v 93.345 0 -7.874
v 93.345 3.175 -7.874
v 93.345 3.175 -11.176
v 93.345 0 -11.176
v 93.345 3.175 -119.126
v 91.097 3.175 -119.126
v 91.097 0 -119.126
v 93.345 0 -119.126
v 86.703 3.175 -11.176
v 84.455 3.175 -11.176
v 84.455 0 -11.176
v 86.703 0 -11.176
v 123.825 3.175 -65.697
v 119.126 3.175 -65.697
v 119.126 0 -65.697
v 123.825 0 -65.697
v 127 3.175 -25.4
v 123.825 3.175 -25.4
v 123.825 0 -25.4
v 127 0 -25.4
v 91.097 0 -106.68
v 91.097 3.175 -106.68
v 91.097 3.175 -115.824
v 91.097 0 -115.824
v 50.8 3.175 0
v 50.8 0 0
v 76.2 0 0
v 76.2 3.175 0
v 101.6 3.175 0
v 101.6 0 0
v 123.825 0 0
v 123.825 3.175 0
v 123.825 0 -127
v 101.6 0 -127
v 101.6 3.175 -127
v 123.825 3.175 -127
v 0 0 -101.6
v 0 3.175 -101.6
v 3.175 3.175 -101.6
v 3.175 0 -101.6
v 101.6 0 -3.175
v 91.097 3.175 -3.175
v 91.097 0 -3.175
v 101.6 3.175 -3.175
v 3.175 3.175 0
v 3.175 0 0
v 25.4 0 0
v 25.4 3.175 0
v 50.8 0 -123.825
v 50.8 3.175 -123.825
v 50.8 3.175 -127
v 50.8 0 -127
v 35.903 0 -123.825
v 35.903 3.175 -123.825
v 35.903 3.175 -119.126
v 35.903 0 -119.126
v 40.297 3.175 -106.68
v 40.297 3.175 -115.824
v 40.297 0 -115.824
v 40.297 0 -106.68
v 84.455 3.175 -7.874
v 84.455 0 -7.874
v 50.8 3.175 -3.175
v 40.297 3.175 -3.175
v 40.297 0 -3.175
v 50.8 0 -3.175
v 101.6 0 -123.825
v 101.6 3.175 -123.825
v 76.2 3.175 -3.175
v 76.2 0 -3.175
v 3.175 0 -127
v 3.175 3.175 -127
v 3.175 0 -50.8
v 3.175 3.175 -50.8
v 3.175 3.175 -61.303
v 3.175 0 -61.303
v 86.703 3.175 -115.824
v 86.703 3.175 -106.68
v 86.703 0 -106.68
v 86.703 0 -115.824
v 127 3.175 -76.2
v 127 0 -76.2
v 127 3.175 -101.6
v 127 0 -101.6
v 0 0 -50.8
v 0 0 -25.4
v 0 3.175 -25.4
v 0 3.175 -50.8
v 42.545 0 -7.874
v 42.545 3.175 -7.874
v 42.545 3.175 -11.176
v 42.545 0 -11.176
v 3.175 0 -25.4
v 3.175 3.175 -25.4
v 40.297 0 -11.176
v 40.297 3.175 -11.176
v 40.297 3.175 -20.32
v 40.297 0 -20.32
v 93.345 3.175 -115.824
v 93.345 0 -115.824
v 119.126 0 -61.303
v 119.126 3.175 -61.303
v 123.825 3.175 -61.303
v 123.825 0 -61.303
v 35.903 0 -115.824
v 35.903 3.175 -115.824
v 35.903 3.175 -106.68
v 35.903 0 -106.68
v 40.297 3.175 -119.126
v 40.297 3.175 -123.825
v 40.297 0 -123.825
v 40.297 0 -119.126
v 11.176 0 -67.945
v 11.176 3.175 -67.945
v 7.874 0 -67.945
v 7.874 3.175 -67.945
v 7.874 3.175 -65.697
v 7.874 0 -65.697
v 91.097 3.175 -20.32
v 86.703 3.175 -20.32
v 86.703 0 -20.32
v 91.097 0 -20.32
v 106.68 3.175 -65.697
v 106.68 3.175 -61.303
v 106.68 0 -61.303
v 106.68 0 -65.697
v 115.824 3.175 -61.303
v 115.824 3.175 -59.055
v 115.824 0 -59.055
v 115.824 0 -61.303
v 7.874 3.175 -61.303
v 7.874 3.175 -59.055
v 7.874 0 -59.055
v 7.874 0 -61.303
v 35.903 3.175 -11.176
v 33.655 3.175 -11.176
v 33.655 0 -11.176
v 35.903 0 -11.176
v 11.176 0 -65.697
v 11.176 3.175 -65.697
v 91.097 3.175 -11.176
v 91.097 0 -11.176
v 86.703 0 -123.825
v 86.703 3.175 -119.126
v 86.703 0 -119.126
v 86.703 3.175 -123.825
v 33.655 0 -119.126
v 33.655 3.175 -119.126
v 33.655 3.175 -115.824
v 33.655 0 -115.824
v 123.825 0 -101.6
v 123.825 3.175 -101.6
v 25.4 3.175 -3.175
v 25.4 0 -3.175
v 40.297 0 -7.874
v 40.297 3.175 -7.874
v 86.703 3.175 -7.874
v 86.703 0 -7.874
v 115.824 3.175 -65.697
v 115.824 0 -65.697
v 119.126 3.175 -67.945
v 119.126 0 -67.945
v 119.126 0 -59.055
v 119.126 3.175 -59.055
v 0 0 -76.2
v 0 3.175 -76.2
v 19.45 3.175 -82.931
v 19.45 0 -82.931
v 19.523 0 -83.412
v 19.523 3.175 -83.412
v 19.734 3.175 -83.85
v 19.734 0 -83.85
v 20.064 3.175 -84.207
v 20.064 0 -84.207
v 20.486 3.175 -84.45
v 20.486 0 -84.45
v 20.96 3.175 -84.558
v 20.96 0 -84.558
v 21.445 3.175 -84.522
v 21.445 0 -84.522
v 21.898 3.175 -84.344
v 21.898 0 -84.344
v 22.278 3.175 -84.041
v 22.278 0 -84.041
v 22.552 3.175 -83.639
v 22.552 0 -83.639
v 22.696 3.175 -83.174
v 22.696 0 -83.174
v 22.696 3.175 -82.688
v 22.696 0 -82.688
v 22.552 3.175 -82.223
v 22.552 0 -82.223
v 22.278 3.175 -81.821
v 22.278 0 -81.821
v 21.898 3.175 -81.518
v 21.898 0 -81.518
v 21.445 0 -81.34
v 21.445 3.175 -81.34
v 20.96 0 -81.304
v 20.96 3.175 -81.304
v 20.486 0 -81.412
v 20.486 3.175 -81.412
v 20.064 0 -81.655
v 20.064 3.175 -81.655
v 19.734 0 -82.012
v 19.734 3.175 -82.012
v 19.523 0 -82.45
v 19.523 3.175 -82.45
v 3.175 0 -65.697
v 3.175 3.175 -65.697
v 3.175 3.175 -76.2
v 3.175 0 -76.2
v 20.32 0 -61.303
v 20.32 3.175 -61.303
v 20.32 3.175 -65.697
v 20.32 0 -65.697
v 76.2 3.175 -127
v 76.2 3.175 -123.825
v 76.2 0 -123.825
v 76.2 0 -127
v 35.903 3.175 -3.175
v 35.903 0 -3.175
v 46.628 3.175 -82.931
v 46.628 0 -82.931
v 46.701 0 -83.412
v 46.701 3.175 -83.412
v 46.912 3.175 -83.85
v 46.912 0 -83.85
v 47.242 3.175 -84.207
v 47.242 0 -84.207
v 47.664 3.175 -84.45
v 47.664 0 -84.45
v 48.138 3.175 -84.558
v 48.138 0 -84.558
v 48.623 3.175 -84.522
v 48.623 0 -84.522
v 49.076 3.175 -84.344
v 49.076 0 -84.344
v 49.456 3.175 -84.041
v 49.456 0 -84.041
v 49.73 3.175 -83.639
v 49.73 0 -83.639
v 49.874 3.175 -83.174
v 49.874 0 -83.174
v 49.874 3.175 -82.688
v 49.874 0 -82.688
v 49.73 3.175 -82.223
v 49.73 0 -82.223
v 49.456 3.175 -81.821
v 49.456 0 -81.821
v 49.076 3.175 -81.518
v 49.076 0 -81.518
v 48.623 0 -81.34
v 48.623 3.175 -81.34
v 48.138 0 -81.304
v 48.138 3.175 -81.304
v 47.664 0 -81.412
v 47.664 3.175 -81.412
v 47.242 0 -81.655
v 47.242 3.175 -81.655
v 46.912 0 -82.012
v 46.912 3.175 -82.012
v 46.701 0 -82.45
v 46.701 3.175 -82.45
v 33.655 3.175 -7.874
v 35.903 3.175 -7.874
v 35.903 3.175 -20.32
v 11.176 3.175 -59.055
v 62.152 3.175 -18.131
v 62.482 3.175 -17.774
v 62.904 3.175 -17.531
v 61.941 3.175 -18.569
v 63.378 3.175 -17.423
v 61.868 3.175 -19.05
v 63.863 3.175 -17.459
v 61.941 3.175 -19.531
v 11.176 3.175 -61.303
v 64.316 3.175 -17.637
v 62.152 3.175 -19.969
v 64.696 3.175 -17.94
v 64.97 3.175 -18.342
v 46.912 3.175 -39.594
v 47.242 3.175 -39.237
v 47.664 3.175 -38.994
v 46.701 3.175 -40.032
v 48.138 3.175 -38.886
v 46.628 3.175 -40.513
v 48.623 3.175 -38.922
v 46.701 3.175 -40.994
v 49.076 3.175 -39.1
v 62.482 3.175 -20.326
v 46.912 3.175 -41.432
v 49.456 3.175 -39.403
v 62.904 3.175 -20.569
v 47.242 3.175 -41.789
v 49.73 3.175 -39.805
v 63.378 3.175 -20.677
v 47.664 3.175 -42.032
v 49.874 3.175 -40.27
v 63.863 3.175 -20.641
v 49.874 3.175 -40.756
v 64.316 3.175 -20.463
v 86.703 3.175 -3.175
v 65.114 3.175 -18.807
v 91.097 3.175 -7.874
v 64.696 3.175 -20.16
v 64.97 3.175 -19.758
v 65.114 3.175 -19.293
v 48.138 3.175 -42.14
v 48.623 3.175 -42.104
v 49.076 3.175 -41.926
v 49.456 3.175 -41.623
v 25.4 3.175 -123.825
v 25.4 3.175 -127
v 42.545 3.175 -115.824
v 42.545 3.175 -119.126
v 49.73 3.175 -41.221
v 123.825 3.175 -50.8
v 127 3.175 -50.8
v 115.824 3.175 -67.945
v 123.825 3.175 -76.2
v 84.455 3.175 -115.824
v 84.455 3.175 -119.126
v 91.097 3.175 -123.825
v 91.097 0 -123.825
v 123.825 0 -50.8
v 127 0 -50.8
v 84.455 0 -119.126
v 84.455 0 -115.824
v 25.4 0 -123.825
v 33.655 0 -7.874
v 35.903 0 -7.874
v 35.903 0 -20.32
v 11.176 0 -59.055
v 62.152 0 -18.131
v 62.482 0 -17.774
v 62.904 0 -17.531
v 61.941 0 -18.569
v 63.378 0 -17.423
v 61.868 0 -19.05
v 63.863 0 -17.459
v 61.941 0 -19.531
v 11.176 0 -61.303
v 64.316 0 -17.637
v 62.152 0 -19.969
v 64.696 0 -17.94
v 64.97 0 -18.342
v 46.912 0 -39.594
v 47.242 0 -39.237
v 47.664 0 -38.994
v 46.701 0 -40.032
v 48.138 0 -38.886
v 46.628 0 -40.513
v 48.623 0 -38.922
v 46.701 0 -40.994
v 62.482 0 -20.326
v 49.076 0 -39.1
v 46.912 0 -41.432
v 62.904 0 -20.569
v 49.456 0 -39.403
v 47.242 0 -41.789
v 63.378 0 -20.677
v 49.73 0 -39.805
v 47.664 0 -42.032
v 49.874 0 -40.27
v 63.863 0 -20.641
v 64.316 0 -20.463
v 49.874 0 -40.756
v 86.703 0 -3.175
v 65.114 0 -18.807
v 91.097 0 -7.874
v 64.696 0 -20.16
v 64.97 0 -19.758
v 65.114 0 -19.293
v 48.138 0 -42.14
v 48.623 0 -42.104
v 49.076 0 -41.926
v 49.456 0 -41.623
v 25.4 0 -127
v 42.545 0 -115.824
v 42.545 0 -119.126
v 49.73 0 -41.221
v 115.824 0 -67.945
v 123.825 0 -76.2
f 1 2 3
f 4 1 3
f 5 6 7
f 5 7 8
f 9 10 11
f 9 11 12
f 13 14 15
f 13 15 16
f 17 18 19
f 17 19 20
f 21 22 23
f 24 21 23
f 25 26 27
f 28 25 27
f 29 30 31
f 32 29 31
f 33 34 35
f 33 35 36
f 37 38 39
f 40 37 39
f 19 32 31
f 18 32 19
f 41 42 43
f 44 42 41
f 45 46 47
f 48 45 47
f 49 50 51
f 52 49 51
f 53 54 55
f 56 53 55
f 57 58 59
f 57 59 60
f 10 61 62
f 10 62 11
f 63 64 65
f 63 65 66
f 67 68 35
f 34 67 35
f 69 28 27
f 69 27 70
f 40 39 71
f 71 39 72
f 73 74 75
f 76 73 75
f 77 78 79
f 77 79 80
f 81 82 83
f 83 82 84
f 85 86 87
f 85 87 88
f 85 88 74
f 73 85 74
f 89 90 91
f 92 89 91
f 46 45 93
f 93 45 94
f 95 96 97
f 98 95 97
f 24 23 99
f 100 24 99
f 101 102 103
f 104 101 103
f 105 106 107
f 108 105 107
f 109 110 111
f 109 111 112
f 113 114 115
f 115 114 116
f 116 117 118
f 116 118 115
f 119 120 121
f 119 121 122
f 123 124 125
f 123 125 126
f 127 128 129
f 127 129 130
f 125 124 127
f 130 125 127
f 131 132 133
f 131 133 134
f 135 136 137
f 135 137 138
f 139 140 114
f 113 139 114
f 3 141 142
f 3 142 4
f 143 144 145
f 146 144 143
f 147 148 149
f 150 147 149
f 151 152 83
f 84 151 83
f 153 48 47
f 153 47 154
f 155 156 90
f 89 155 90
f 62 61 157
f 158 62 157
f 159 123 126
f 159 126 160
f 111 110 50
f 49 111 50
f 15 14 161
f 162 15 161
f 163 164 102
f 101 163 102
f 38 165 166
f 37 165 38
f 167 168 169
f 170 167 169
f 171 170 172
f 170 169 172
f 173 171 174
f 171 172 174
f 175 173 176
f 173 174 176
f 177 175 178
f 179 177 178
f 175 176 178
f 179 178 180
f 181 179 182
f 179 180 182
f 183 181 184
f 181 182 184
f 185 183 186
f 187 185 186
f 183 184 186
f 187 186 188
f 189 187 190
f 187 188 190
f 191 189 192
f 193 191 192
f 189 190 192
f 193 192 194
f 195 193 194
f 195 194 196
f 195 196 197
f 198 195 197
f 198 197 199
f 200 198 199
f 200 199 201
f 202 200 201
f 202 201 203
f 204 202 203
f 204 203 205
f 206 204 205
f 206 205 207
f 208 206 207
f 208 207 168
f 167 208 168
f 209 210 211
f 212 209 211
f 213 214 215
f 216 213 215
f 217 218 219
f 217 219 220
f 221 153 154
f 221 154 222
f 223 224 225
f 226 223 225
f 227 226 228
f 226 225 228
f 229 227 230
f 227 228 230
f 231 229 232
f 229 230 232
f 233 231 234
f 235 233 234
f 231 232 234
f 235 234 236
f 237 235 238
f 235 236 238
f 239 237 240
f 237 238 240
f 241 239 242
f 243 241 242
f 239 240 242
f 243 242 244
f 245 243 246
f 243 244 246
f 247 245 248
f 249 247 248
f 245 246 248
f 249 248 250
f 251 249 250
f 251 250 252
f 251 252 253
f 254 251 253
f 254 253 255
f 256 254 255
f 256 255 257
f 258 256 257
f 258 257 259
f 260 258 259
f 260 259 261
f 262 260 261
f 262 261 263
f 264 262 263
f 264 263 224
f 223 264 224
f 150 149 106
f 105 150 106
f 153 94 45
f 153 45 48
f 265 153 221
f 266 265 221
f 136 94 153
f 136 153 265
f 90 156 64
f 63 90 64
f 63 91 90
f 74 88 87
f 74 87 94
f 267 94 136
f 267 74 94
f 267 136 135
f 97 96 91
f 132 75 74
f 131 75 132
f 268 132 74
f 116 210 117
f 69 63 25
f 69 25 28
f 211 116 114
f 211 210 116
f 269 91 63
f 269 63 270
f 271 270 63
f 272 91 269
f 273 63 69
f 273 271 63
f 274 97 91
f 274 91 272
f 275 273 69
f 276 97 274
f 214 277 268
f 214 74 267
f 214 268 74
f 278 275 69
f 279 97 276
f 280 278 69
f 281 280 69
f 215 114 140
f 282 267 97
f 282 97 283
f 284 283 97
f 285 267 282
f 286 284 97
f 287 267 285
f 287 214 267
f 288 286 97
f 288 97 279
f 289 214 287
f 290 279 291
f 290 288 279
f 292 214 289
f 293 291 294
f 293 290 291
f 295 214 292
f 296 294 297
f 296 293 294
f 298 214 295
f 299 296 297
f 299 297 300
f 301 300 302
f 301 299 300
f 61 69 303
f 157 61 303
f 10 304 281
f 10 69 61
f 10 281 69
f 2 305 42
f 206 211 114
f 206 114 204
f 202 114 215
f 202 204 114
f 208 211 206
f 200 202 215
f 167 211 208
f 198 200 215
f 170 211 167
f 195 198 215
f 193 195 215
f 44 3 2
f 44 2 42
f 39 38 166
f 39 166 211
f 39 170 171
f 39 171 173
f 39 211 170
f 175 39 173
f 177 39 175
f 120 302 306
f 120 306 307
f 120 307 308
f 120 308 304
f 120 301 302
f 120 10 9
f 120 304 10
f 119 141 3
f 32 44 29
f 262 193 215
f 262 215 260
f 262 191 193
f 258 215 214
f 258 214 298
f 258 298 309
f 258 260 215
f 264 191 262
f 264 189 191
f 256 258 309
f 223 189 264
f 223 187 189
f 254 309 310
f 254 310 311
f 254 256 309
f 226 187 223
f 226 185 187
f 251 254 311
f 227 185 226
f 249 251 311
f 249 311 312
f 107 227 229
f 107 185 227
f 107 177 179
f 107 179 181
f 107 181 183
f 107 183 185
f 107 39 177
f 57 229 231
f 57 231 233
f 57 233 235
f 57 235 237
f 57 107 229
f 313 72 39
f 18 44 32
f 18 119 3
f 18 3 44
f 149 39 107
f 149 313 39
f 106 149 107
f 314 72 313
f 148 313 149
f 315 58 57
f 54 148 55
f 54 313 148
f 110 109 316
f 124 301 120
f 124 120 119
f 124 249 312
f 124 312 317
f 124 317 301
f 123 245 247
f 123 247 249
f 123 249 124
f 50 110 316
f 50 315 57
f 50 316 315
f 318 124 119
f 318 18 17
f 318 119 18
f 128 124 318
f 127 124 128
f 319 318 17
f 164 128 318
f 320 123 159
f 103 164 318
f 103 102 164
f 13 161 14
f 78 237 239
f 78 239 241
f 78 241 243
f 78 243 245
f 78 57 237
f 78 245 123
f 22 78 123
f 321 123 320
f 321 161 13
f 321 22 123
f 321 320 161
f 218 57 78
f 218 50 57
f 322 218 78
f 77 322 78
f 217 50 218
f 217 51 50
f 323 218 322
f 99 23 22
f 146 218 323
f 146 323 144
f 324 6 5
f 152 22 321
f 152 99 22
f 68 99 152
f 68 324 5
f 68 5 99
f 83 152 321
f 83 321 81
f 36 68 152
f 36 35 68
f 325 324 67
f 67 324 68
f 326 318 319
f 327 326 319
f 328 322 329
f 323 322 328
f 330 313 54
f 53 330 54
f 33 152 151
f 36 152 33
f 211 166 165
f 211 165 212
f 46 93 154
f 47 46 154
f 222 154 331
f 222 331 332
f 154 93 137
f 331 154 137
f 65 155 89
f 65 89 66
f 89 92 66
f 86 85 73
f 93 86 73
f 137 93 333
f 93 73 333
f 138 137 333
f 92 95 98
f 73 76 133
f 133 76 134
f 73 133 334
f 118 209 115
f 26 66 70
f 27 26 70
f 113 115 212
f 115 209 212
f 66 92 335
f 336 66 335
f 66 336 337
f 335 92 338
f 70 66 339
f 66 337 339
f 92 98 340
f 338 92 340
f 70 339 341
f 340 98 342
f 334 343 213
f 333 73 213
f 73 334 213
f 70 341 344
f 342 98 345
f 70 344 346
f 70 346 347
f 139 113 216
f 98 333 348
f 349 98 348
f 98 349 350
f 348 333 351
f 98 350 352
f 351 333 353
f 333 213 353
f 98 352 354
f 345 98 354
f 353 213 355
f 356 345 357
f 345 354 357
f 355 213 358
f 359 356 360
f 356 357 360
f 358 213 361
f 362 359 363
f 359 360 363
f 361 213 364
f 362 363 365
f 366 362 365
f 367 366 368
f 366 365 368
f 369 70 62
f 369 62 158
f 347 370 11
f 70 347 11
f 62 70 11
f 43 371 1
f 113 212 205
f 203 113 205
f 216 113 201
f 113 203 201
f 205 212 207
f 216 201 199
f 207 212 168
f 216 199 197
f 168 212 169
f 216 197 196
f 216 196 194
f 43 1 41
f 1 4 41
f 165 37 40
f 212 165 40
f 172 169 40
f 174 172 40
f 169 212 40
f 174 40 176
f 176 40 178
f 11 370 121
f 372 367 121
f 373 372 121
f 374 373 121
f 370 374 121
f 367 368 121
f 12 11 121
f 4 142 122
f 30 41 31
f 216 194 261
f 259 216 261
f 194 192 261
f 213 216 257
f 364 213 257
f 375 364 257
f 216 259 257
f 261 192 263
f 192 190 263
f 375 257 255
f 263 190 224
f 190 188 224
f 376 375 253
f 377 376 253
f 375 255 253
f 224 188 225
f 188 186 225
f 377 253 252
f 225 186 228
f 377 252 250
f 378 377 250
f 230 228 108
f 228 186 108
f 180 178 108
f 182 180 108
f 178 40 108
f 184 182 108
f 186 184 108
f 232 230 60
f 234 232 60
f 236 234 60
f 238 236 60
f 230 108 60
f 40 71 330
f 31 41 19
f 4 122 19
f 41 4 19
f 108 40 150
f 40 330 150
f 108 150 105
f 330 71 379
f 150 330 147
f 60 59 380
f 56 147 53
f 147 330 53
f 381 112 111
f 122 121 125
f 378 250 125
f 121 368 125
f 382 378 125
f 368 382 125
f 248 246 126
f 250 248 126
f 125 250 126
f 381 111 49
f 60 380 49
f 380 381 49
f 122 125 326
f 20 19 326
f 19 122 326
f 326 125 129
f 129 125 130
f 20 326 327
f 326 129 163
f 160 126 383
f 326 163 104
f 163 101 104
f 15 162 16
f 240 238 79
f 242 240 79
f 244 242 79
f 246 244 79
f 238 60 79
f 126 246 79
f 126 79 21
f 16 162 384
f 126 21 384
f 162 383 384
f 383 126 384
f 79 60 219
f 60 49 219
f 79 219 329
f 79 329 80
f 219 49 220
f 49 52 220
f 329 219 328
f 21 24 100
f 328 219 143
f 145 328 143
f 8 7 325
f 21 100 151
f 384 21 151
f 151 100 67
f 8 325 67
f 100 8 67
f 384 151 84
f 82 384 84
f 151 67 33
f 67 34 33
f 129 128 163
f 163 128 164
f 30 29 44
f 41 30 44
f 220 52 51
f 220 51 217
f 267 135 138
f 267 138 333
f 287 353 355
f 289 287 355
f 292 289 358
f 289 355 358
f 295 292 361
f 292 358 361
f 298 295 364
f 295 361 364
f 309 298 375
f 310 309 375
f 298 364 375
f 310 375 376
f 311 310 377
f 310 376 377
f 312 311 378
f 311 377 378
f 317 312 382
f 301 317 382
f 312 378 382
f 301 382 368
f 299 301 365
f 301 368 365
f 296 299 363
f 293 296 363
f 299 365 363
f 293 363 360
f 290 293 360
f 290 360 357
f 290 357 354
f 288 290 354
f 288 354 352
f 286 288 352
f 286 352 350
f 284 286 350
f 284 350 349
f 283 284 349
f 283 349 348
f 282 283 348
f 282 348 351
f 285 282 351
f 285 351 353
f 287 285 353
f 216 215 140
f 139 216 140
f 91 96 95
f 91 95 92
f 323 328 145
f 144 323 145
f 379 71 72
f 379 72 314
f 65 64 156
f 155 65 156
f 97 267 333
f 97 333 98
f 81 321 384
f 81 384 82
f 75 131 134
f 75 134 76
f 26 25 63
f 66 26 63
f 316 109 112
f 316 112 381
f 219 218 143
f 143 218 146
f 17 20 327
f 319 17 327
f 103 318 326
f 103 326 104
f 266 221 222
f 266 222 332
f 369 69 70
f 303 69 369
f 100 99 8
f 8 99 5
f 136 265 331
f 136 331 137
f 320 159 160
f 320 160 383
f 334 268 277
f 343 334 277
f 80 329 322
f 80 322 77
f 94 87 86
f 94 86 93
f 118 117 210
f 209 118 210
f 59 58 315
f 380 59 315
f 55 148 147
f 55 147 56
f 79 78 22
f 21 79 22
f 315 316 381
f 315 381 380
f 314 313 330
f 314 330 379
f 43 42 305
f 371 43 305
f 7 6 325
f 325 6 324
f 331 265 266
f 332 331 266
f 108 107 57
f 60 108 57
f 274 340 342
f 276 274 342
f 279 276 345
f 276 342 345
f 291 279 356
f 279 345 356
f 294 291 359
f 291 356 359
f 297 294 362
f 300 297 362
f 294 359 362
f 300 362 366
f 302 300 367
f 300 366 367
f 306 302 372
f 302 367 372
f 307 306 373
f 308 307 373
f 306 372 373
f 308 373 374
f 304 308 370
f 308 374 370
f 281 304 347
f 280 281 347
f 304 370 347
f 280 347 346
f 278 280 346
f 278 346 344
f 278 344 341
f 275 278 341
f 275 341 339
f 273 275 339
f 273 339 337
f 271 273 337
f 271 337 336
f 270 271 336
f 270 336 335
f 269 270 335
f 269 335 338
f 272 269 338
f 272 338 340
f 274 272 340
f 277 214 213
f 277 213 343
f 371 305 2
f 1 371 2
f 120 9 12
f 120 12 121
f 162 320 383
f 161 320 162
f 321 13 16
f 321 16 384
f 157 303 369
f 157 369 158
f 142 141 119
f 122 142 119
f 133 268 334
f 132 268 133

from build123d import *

# Parameters (mm, degrees)
SKETCH1_W                 = 127
SKETCH1_H                 = 127
BOSS_EXTRUDE1_DEPTH       = 3.175
SKETCH2_W                 = 3.175
SKETCH2_H                 = 25.4
CUT_EXTRUDE1_DEPTH        = 6.35
LPATTERN1_COUNT           = 3
LPATTERN1_PITCH           = 50.8
LPATTERN1_COUNT_DIR2      = 2
LPATTERN1_PITCH_DIR2      = 123.825
SKETCH3_W                 = 25.4
SKETCH3_H                 = 3.175
CUT_EXTRUDE2_DEPTH        = 6.35
LPATTERN2_COUNT           = 3
LPATTERN2_PITCH           = 50.8
LPATTERN2_COUNT_DIR2      = 2
LPATTERN2_PITCH_DIR2      = 123.825
SKETCH4_W                 = 17.145
SKETCH4_H                 = 4.3942
SKETCH4_W_2               = 3.302
SKETCH4_H_2               = 8.89
CUT_EXTRUDE3_DEPTH        = 8.89
SKETCH5_W                 = 4.3942
SKETCH5_H                 = 17.145
SKETCH5_W_2               = 8.89
SKETCH5_H_2               = 3.302
CUT_EXTRUDE4_DEPTH        = 30.48
LPATTERN3_COUNT           = 2
LPATTERN3_PITCH           = 50.8
MIRROR2_COPY_1_SKETCH_W   = 4.3942
MIRROR2_COPY_1_SKETCH_H   = 17.145
MIRROR2_COPY_1_SKETCH_W_2 = 8.89
MIRROR2_COPY_1_SKETCH_H_2 = 3.302
MIRROR2_COPY_1_DEPTH      = 30.48
F_4_CLEARANCE_HOLE3_D     = 3.2639
F_4_CLEARANCE_HOLE3_DEPTH = 10.16
F_4_CLEARANCE_HOLE3_TIP   = 0.980574487
F_4_CLEARANCE_HOLE4_D     = 3.2639
F_4_CLEARANCE_HOLE4_DEPTH = 10.16
F_4_CLEARANCE_HOLE4_TIP   = 0.980574487


with BuildPart() as part:
    # Sketch1 → Boss-Extrude1 (new body)
    with BuildSketch(Plane(origin=(0, 0, 0), x_dir=(1, 0, 0), z_dir=(0, 1, 0))):
        with Locations((63.5, 63.5)):
            Rectangle(SKETCH1_W, SKETCH1_H)
    extrude(amount=BOSS_EXTRUDE1_DEPTH)

    # Sketch2 → Cut-Extrude1 (cut)
    with BuildSketch(Plane(origin=(0, 3.175, 0), x_dir=(1, 0, 0), z_dir=(0, 1, 0))):
        with Locations((1.5875, 114.3)):
            Rectangle(SKETCH2_W, SKETCH2_H)
    cut_extrude1 = extrude(amount=-CUT_EXTRUDE1_DEPTH, mode=Mode.SUBTRACT)

    # LPattern1: Cut-Extrude1 3 × 2
    with Locations(*[(j * LPATTERN1_PITCH_DIR2, 0, i * LPATTERN1_PITCH) for i in range(LPATTERN1_COUNT) for j in range(LPATTERN1_COUNT_DIR2) if (i, j) != (0, 0)]):
        add(cut_extrude1, mode=Mode.SUBTRACT)

    # Sketch3 → Cut-Extrude2 (cut)
    with BuildSketch(Plane(origin=(0, 3.175, 0), x_dir=(1, 0, 0), z_dir=(0, 1, 0))):
        with Locations((38.1, 1.5875)):
            Rectangle(SKETCH3_W, SKETCH3_H)
    cut_extrude2 = extrude(amount=-CUT_EXTRUDE2_DEPTH, mode=Mode.SUBTRACT)

    # LPattern2: Cut-Extrude2 3 × 2
    with Locations(*[(i * LPATTERN2_PITCH, 0, -j * LPATTERN2_PITCH_DIR2) for i in range(LPATTERN2_COUNT) for j in range(LPATTERN2_COUNT_DIR2) if (i, j) != (0, 0)]):
        add(cut_extrude2, mode=Mode.SUBTRACT)

    # Sketch4 → Cut-Extrude3 (cut)
    with BuildSketch(Plane(origin=(0, 3.175, 0), x_dir=(1, 0, 0), z_dir=(0, 1, 0))):
        with Locations((115.2525, 63.5)):
            Rectangle(SKETCH4_W, SKETCH4_H)
        with Locations((117.475, 63.5)):
            Rectangle(SKETCH4_W_2, SKETCH4_H_2)
    cut_extrude3 = extrude(amount=-CUT_EXTRUDE3_DEPTH, mode=Mode.SUBTRACT)

    # Sketch5 → Cut-Extrude4 (cut)
    with BuildSketch(Plane(origin=(0, 3.175, 0), x_dir=(1, 0, 0), z_dir=(0, 1, 0))):
        with Locations((38.1, 11.7475)):
            Rectangle(SKETCH5_W, SKETCH5_H)
        with Locations((38.1, 9.525)):
            Rectangle(SKETCH5_W_2, SKETCH5_H_2)
    cut_extrude4 = extrude(amount=-CUT_EXTRUDE4_DEPTH, mode=Mode.SUBTRACT)

    # LPattern3: Cut-Extrude4 ×2
    with Locations(*[(i * LPATTERN3_PITCH, 0, 0) for i in range(1, LPATTERN3_COUNT)]):
        add(cut_extrude4, mode=Mode.SUBTRACT)

    # Mirror2: Cut-Extrude4 across plane
    add(cut_extrude4.mirror(Plane.XY.offset(-63.5)), mode=Mode.SUBTRACT)

    # Mirror2 copy 1 sketch → Mirror2 copy 1 (cut)
    with BuildSketch(Plane(origin=(50.8, 3.175, -127), x_dir=(1, 0, 0), z_dir=(0, 1, 0))):
        with Locations((38.1, -11.7475)):
            Rectangle(MIRROR2_COPY_1_SKETCH_W, MIRROR2_COPY_1_SKETCH_H)
        with Locations((38.1, -9.525)):
            Rectangle(MIRROR2_COPY_1_SKETCH_W_2, MIRROR2_COPY_1_SKETCH_H_2)
    extrude(amount=-MIRROR2_COPY_1_DEPTH, mode=Mode.SUBTRACT)

    # #4 Clearance Hole3
    with Locations(Plane(origin=(0, 3.175, 0), x_dir=(1, 0, 0), z_dir=(0, 1, 0))):
        with Locations((21.082, 82.931), (48.26, 82.931), (48.26, 40.513)):
            Hole(F_4_CLEARANCE_HOLE3_D / 2, depth=F_4_CLEARANCE_HOLE3_DEPTH)
            with Locations((0, 0, -(F_4_CLEARANCE_HOLE3_DEPTH + F_4_CLEARANCE_HOLE3_TIP / 2))):  # 118° drill point
                Cone(0, F_4_CLEARANCE_HOLE3_D / 2, F_4_CLEARANCE_HOLE3_TIP, mode=Mode.SUBTRACT)

    # #4 Clearance Hole4
    with Locations(Plane(origin=(0, 3.175, 0), x_dir=(1, 0, 0), z_dir=(0, 1, 0))):
        with Locations((63.5, 19.05)):
            Hole(F_4_CLEARANCE_HOLE4_D / 2, depth=F_4_CLEARANCE_HOLE4_DEPTH)
            with Locations((0, 0, -(F_4_CLEARANCE_HOLE4_DEPTH + F_4_CLEARANCE_HOLE4_TIP / 2))):  # 118° drill point
                Cone(0, F_4_CLEARANCE_HOLE4_D / 2, F_4_CLEARANCE_HOLE4_TIP, mode=Mode.SUBTRACT)

    # Mirror3: Cut-Extrude3 across plane
    add(cut_extrude3.mirror(Plane.ZY.offset(-63.5)), mode=Mode.SUBTRACT)


solid = part.part
